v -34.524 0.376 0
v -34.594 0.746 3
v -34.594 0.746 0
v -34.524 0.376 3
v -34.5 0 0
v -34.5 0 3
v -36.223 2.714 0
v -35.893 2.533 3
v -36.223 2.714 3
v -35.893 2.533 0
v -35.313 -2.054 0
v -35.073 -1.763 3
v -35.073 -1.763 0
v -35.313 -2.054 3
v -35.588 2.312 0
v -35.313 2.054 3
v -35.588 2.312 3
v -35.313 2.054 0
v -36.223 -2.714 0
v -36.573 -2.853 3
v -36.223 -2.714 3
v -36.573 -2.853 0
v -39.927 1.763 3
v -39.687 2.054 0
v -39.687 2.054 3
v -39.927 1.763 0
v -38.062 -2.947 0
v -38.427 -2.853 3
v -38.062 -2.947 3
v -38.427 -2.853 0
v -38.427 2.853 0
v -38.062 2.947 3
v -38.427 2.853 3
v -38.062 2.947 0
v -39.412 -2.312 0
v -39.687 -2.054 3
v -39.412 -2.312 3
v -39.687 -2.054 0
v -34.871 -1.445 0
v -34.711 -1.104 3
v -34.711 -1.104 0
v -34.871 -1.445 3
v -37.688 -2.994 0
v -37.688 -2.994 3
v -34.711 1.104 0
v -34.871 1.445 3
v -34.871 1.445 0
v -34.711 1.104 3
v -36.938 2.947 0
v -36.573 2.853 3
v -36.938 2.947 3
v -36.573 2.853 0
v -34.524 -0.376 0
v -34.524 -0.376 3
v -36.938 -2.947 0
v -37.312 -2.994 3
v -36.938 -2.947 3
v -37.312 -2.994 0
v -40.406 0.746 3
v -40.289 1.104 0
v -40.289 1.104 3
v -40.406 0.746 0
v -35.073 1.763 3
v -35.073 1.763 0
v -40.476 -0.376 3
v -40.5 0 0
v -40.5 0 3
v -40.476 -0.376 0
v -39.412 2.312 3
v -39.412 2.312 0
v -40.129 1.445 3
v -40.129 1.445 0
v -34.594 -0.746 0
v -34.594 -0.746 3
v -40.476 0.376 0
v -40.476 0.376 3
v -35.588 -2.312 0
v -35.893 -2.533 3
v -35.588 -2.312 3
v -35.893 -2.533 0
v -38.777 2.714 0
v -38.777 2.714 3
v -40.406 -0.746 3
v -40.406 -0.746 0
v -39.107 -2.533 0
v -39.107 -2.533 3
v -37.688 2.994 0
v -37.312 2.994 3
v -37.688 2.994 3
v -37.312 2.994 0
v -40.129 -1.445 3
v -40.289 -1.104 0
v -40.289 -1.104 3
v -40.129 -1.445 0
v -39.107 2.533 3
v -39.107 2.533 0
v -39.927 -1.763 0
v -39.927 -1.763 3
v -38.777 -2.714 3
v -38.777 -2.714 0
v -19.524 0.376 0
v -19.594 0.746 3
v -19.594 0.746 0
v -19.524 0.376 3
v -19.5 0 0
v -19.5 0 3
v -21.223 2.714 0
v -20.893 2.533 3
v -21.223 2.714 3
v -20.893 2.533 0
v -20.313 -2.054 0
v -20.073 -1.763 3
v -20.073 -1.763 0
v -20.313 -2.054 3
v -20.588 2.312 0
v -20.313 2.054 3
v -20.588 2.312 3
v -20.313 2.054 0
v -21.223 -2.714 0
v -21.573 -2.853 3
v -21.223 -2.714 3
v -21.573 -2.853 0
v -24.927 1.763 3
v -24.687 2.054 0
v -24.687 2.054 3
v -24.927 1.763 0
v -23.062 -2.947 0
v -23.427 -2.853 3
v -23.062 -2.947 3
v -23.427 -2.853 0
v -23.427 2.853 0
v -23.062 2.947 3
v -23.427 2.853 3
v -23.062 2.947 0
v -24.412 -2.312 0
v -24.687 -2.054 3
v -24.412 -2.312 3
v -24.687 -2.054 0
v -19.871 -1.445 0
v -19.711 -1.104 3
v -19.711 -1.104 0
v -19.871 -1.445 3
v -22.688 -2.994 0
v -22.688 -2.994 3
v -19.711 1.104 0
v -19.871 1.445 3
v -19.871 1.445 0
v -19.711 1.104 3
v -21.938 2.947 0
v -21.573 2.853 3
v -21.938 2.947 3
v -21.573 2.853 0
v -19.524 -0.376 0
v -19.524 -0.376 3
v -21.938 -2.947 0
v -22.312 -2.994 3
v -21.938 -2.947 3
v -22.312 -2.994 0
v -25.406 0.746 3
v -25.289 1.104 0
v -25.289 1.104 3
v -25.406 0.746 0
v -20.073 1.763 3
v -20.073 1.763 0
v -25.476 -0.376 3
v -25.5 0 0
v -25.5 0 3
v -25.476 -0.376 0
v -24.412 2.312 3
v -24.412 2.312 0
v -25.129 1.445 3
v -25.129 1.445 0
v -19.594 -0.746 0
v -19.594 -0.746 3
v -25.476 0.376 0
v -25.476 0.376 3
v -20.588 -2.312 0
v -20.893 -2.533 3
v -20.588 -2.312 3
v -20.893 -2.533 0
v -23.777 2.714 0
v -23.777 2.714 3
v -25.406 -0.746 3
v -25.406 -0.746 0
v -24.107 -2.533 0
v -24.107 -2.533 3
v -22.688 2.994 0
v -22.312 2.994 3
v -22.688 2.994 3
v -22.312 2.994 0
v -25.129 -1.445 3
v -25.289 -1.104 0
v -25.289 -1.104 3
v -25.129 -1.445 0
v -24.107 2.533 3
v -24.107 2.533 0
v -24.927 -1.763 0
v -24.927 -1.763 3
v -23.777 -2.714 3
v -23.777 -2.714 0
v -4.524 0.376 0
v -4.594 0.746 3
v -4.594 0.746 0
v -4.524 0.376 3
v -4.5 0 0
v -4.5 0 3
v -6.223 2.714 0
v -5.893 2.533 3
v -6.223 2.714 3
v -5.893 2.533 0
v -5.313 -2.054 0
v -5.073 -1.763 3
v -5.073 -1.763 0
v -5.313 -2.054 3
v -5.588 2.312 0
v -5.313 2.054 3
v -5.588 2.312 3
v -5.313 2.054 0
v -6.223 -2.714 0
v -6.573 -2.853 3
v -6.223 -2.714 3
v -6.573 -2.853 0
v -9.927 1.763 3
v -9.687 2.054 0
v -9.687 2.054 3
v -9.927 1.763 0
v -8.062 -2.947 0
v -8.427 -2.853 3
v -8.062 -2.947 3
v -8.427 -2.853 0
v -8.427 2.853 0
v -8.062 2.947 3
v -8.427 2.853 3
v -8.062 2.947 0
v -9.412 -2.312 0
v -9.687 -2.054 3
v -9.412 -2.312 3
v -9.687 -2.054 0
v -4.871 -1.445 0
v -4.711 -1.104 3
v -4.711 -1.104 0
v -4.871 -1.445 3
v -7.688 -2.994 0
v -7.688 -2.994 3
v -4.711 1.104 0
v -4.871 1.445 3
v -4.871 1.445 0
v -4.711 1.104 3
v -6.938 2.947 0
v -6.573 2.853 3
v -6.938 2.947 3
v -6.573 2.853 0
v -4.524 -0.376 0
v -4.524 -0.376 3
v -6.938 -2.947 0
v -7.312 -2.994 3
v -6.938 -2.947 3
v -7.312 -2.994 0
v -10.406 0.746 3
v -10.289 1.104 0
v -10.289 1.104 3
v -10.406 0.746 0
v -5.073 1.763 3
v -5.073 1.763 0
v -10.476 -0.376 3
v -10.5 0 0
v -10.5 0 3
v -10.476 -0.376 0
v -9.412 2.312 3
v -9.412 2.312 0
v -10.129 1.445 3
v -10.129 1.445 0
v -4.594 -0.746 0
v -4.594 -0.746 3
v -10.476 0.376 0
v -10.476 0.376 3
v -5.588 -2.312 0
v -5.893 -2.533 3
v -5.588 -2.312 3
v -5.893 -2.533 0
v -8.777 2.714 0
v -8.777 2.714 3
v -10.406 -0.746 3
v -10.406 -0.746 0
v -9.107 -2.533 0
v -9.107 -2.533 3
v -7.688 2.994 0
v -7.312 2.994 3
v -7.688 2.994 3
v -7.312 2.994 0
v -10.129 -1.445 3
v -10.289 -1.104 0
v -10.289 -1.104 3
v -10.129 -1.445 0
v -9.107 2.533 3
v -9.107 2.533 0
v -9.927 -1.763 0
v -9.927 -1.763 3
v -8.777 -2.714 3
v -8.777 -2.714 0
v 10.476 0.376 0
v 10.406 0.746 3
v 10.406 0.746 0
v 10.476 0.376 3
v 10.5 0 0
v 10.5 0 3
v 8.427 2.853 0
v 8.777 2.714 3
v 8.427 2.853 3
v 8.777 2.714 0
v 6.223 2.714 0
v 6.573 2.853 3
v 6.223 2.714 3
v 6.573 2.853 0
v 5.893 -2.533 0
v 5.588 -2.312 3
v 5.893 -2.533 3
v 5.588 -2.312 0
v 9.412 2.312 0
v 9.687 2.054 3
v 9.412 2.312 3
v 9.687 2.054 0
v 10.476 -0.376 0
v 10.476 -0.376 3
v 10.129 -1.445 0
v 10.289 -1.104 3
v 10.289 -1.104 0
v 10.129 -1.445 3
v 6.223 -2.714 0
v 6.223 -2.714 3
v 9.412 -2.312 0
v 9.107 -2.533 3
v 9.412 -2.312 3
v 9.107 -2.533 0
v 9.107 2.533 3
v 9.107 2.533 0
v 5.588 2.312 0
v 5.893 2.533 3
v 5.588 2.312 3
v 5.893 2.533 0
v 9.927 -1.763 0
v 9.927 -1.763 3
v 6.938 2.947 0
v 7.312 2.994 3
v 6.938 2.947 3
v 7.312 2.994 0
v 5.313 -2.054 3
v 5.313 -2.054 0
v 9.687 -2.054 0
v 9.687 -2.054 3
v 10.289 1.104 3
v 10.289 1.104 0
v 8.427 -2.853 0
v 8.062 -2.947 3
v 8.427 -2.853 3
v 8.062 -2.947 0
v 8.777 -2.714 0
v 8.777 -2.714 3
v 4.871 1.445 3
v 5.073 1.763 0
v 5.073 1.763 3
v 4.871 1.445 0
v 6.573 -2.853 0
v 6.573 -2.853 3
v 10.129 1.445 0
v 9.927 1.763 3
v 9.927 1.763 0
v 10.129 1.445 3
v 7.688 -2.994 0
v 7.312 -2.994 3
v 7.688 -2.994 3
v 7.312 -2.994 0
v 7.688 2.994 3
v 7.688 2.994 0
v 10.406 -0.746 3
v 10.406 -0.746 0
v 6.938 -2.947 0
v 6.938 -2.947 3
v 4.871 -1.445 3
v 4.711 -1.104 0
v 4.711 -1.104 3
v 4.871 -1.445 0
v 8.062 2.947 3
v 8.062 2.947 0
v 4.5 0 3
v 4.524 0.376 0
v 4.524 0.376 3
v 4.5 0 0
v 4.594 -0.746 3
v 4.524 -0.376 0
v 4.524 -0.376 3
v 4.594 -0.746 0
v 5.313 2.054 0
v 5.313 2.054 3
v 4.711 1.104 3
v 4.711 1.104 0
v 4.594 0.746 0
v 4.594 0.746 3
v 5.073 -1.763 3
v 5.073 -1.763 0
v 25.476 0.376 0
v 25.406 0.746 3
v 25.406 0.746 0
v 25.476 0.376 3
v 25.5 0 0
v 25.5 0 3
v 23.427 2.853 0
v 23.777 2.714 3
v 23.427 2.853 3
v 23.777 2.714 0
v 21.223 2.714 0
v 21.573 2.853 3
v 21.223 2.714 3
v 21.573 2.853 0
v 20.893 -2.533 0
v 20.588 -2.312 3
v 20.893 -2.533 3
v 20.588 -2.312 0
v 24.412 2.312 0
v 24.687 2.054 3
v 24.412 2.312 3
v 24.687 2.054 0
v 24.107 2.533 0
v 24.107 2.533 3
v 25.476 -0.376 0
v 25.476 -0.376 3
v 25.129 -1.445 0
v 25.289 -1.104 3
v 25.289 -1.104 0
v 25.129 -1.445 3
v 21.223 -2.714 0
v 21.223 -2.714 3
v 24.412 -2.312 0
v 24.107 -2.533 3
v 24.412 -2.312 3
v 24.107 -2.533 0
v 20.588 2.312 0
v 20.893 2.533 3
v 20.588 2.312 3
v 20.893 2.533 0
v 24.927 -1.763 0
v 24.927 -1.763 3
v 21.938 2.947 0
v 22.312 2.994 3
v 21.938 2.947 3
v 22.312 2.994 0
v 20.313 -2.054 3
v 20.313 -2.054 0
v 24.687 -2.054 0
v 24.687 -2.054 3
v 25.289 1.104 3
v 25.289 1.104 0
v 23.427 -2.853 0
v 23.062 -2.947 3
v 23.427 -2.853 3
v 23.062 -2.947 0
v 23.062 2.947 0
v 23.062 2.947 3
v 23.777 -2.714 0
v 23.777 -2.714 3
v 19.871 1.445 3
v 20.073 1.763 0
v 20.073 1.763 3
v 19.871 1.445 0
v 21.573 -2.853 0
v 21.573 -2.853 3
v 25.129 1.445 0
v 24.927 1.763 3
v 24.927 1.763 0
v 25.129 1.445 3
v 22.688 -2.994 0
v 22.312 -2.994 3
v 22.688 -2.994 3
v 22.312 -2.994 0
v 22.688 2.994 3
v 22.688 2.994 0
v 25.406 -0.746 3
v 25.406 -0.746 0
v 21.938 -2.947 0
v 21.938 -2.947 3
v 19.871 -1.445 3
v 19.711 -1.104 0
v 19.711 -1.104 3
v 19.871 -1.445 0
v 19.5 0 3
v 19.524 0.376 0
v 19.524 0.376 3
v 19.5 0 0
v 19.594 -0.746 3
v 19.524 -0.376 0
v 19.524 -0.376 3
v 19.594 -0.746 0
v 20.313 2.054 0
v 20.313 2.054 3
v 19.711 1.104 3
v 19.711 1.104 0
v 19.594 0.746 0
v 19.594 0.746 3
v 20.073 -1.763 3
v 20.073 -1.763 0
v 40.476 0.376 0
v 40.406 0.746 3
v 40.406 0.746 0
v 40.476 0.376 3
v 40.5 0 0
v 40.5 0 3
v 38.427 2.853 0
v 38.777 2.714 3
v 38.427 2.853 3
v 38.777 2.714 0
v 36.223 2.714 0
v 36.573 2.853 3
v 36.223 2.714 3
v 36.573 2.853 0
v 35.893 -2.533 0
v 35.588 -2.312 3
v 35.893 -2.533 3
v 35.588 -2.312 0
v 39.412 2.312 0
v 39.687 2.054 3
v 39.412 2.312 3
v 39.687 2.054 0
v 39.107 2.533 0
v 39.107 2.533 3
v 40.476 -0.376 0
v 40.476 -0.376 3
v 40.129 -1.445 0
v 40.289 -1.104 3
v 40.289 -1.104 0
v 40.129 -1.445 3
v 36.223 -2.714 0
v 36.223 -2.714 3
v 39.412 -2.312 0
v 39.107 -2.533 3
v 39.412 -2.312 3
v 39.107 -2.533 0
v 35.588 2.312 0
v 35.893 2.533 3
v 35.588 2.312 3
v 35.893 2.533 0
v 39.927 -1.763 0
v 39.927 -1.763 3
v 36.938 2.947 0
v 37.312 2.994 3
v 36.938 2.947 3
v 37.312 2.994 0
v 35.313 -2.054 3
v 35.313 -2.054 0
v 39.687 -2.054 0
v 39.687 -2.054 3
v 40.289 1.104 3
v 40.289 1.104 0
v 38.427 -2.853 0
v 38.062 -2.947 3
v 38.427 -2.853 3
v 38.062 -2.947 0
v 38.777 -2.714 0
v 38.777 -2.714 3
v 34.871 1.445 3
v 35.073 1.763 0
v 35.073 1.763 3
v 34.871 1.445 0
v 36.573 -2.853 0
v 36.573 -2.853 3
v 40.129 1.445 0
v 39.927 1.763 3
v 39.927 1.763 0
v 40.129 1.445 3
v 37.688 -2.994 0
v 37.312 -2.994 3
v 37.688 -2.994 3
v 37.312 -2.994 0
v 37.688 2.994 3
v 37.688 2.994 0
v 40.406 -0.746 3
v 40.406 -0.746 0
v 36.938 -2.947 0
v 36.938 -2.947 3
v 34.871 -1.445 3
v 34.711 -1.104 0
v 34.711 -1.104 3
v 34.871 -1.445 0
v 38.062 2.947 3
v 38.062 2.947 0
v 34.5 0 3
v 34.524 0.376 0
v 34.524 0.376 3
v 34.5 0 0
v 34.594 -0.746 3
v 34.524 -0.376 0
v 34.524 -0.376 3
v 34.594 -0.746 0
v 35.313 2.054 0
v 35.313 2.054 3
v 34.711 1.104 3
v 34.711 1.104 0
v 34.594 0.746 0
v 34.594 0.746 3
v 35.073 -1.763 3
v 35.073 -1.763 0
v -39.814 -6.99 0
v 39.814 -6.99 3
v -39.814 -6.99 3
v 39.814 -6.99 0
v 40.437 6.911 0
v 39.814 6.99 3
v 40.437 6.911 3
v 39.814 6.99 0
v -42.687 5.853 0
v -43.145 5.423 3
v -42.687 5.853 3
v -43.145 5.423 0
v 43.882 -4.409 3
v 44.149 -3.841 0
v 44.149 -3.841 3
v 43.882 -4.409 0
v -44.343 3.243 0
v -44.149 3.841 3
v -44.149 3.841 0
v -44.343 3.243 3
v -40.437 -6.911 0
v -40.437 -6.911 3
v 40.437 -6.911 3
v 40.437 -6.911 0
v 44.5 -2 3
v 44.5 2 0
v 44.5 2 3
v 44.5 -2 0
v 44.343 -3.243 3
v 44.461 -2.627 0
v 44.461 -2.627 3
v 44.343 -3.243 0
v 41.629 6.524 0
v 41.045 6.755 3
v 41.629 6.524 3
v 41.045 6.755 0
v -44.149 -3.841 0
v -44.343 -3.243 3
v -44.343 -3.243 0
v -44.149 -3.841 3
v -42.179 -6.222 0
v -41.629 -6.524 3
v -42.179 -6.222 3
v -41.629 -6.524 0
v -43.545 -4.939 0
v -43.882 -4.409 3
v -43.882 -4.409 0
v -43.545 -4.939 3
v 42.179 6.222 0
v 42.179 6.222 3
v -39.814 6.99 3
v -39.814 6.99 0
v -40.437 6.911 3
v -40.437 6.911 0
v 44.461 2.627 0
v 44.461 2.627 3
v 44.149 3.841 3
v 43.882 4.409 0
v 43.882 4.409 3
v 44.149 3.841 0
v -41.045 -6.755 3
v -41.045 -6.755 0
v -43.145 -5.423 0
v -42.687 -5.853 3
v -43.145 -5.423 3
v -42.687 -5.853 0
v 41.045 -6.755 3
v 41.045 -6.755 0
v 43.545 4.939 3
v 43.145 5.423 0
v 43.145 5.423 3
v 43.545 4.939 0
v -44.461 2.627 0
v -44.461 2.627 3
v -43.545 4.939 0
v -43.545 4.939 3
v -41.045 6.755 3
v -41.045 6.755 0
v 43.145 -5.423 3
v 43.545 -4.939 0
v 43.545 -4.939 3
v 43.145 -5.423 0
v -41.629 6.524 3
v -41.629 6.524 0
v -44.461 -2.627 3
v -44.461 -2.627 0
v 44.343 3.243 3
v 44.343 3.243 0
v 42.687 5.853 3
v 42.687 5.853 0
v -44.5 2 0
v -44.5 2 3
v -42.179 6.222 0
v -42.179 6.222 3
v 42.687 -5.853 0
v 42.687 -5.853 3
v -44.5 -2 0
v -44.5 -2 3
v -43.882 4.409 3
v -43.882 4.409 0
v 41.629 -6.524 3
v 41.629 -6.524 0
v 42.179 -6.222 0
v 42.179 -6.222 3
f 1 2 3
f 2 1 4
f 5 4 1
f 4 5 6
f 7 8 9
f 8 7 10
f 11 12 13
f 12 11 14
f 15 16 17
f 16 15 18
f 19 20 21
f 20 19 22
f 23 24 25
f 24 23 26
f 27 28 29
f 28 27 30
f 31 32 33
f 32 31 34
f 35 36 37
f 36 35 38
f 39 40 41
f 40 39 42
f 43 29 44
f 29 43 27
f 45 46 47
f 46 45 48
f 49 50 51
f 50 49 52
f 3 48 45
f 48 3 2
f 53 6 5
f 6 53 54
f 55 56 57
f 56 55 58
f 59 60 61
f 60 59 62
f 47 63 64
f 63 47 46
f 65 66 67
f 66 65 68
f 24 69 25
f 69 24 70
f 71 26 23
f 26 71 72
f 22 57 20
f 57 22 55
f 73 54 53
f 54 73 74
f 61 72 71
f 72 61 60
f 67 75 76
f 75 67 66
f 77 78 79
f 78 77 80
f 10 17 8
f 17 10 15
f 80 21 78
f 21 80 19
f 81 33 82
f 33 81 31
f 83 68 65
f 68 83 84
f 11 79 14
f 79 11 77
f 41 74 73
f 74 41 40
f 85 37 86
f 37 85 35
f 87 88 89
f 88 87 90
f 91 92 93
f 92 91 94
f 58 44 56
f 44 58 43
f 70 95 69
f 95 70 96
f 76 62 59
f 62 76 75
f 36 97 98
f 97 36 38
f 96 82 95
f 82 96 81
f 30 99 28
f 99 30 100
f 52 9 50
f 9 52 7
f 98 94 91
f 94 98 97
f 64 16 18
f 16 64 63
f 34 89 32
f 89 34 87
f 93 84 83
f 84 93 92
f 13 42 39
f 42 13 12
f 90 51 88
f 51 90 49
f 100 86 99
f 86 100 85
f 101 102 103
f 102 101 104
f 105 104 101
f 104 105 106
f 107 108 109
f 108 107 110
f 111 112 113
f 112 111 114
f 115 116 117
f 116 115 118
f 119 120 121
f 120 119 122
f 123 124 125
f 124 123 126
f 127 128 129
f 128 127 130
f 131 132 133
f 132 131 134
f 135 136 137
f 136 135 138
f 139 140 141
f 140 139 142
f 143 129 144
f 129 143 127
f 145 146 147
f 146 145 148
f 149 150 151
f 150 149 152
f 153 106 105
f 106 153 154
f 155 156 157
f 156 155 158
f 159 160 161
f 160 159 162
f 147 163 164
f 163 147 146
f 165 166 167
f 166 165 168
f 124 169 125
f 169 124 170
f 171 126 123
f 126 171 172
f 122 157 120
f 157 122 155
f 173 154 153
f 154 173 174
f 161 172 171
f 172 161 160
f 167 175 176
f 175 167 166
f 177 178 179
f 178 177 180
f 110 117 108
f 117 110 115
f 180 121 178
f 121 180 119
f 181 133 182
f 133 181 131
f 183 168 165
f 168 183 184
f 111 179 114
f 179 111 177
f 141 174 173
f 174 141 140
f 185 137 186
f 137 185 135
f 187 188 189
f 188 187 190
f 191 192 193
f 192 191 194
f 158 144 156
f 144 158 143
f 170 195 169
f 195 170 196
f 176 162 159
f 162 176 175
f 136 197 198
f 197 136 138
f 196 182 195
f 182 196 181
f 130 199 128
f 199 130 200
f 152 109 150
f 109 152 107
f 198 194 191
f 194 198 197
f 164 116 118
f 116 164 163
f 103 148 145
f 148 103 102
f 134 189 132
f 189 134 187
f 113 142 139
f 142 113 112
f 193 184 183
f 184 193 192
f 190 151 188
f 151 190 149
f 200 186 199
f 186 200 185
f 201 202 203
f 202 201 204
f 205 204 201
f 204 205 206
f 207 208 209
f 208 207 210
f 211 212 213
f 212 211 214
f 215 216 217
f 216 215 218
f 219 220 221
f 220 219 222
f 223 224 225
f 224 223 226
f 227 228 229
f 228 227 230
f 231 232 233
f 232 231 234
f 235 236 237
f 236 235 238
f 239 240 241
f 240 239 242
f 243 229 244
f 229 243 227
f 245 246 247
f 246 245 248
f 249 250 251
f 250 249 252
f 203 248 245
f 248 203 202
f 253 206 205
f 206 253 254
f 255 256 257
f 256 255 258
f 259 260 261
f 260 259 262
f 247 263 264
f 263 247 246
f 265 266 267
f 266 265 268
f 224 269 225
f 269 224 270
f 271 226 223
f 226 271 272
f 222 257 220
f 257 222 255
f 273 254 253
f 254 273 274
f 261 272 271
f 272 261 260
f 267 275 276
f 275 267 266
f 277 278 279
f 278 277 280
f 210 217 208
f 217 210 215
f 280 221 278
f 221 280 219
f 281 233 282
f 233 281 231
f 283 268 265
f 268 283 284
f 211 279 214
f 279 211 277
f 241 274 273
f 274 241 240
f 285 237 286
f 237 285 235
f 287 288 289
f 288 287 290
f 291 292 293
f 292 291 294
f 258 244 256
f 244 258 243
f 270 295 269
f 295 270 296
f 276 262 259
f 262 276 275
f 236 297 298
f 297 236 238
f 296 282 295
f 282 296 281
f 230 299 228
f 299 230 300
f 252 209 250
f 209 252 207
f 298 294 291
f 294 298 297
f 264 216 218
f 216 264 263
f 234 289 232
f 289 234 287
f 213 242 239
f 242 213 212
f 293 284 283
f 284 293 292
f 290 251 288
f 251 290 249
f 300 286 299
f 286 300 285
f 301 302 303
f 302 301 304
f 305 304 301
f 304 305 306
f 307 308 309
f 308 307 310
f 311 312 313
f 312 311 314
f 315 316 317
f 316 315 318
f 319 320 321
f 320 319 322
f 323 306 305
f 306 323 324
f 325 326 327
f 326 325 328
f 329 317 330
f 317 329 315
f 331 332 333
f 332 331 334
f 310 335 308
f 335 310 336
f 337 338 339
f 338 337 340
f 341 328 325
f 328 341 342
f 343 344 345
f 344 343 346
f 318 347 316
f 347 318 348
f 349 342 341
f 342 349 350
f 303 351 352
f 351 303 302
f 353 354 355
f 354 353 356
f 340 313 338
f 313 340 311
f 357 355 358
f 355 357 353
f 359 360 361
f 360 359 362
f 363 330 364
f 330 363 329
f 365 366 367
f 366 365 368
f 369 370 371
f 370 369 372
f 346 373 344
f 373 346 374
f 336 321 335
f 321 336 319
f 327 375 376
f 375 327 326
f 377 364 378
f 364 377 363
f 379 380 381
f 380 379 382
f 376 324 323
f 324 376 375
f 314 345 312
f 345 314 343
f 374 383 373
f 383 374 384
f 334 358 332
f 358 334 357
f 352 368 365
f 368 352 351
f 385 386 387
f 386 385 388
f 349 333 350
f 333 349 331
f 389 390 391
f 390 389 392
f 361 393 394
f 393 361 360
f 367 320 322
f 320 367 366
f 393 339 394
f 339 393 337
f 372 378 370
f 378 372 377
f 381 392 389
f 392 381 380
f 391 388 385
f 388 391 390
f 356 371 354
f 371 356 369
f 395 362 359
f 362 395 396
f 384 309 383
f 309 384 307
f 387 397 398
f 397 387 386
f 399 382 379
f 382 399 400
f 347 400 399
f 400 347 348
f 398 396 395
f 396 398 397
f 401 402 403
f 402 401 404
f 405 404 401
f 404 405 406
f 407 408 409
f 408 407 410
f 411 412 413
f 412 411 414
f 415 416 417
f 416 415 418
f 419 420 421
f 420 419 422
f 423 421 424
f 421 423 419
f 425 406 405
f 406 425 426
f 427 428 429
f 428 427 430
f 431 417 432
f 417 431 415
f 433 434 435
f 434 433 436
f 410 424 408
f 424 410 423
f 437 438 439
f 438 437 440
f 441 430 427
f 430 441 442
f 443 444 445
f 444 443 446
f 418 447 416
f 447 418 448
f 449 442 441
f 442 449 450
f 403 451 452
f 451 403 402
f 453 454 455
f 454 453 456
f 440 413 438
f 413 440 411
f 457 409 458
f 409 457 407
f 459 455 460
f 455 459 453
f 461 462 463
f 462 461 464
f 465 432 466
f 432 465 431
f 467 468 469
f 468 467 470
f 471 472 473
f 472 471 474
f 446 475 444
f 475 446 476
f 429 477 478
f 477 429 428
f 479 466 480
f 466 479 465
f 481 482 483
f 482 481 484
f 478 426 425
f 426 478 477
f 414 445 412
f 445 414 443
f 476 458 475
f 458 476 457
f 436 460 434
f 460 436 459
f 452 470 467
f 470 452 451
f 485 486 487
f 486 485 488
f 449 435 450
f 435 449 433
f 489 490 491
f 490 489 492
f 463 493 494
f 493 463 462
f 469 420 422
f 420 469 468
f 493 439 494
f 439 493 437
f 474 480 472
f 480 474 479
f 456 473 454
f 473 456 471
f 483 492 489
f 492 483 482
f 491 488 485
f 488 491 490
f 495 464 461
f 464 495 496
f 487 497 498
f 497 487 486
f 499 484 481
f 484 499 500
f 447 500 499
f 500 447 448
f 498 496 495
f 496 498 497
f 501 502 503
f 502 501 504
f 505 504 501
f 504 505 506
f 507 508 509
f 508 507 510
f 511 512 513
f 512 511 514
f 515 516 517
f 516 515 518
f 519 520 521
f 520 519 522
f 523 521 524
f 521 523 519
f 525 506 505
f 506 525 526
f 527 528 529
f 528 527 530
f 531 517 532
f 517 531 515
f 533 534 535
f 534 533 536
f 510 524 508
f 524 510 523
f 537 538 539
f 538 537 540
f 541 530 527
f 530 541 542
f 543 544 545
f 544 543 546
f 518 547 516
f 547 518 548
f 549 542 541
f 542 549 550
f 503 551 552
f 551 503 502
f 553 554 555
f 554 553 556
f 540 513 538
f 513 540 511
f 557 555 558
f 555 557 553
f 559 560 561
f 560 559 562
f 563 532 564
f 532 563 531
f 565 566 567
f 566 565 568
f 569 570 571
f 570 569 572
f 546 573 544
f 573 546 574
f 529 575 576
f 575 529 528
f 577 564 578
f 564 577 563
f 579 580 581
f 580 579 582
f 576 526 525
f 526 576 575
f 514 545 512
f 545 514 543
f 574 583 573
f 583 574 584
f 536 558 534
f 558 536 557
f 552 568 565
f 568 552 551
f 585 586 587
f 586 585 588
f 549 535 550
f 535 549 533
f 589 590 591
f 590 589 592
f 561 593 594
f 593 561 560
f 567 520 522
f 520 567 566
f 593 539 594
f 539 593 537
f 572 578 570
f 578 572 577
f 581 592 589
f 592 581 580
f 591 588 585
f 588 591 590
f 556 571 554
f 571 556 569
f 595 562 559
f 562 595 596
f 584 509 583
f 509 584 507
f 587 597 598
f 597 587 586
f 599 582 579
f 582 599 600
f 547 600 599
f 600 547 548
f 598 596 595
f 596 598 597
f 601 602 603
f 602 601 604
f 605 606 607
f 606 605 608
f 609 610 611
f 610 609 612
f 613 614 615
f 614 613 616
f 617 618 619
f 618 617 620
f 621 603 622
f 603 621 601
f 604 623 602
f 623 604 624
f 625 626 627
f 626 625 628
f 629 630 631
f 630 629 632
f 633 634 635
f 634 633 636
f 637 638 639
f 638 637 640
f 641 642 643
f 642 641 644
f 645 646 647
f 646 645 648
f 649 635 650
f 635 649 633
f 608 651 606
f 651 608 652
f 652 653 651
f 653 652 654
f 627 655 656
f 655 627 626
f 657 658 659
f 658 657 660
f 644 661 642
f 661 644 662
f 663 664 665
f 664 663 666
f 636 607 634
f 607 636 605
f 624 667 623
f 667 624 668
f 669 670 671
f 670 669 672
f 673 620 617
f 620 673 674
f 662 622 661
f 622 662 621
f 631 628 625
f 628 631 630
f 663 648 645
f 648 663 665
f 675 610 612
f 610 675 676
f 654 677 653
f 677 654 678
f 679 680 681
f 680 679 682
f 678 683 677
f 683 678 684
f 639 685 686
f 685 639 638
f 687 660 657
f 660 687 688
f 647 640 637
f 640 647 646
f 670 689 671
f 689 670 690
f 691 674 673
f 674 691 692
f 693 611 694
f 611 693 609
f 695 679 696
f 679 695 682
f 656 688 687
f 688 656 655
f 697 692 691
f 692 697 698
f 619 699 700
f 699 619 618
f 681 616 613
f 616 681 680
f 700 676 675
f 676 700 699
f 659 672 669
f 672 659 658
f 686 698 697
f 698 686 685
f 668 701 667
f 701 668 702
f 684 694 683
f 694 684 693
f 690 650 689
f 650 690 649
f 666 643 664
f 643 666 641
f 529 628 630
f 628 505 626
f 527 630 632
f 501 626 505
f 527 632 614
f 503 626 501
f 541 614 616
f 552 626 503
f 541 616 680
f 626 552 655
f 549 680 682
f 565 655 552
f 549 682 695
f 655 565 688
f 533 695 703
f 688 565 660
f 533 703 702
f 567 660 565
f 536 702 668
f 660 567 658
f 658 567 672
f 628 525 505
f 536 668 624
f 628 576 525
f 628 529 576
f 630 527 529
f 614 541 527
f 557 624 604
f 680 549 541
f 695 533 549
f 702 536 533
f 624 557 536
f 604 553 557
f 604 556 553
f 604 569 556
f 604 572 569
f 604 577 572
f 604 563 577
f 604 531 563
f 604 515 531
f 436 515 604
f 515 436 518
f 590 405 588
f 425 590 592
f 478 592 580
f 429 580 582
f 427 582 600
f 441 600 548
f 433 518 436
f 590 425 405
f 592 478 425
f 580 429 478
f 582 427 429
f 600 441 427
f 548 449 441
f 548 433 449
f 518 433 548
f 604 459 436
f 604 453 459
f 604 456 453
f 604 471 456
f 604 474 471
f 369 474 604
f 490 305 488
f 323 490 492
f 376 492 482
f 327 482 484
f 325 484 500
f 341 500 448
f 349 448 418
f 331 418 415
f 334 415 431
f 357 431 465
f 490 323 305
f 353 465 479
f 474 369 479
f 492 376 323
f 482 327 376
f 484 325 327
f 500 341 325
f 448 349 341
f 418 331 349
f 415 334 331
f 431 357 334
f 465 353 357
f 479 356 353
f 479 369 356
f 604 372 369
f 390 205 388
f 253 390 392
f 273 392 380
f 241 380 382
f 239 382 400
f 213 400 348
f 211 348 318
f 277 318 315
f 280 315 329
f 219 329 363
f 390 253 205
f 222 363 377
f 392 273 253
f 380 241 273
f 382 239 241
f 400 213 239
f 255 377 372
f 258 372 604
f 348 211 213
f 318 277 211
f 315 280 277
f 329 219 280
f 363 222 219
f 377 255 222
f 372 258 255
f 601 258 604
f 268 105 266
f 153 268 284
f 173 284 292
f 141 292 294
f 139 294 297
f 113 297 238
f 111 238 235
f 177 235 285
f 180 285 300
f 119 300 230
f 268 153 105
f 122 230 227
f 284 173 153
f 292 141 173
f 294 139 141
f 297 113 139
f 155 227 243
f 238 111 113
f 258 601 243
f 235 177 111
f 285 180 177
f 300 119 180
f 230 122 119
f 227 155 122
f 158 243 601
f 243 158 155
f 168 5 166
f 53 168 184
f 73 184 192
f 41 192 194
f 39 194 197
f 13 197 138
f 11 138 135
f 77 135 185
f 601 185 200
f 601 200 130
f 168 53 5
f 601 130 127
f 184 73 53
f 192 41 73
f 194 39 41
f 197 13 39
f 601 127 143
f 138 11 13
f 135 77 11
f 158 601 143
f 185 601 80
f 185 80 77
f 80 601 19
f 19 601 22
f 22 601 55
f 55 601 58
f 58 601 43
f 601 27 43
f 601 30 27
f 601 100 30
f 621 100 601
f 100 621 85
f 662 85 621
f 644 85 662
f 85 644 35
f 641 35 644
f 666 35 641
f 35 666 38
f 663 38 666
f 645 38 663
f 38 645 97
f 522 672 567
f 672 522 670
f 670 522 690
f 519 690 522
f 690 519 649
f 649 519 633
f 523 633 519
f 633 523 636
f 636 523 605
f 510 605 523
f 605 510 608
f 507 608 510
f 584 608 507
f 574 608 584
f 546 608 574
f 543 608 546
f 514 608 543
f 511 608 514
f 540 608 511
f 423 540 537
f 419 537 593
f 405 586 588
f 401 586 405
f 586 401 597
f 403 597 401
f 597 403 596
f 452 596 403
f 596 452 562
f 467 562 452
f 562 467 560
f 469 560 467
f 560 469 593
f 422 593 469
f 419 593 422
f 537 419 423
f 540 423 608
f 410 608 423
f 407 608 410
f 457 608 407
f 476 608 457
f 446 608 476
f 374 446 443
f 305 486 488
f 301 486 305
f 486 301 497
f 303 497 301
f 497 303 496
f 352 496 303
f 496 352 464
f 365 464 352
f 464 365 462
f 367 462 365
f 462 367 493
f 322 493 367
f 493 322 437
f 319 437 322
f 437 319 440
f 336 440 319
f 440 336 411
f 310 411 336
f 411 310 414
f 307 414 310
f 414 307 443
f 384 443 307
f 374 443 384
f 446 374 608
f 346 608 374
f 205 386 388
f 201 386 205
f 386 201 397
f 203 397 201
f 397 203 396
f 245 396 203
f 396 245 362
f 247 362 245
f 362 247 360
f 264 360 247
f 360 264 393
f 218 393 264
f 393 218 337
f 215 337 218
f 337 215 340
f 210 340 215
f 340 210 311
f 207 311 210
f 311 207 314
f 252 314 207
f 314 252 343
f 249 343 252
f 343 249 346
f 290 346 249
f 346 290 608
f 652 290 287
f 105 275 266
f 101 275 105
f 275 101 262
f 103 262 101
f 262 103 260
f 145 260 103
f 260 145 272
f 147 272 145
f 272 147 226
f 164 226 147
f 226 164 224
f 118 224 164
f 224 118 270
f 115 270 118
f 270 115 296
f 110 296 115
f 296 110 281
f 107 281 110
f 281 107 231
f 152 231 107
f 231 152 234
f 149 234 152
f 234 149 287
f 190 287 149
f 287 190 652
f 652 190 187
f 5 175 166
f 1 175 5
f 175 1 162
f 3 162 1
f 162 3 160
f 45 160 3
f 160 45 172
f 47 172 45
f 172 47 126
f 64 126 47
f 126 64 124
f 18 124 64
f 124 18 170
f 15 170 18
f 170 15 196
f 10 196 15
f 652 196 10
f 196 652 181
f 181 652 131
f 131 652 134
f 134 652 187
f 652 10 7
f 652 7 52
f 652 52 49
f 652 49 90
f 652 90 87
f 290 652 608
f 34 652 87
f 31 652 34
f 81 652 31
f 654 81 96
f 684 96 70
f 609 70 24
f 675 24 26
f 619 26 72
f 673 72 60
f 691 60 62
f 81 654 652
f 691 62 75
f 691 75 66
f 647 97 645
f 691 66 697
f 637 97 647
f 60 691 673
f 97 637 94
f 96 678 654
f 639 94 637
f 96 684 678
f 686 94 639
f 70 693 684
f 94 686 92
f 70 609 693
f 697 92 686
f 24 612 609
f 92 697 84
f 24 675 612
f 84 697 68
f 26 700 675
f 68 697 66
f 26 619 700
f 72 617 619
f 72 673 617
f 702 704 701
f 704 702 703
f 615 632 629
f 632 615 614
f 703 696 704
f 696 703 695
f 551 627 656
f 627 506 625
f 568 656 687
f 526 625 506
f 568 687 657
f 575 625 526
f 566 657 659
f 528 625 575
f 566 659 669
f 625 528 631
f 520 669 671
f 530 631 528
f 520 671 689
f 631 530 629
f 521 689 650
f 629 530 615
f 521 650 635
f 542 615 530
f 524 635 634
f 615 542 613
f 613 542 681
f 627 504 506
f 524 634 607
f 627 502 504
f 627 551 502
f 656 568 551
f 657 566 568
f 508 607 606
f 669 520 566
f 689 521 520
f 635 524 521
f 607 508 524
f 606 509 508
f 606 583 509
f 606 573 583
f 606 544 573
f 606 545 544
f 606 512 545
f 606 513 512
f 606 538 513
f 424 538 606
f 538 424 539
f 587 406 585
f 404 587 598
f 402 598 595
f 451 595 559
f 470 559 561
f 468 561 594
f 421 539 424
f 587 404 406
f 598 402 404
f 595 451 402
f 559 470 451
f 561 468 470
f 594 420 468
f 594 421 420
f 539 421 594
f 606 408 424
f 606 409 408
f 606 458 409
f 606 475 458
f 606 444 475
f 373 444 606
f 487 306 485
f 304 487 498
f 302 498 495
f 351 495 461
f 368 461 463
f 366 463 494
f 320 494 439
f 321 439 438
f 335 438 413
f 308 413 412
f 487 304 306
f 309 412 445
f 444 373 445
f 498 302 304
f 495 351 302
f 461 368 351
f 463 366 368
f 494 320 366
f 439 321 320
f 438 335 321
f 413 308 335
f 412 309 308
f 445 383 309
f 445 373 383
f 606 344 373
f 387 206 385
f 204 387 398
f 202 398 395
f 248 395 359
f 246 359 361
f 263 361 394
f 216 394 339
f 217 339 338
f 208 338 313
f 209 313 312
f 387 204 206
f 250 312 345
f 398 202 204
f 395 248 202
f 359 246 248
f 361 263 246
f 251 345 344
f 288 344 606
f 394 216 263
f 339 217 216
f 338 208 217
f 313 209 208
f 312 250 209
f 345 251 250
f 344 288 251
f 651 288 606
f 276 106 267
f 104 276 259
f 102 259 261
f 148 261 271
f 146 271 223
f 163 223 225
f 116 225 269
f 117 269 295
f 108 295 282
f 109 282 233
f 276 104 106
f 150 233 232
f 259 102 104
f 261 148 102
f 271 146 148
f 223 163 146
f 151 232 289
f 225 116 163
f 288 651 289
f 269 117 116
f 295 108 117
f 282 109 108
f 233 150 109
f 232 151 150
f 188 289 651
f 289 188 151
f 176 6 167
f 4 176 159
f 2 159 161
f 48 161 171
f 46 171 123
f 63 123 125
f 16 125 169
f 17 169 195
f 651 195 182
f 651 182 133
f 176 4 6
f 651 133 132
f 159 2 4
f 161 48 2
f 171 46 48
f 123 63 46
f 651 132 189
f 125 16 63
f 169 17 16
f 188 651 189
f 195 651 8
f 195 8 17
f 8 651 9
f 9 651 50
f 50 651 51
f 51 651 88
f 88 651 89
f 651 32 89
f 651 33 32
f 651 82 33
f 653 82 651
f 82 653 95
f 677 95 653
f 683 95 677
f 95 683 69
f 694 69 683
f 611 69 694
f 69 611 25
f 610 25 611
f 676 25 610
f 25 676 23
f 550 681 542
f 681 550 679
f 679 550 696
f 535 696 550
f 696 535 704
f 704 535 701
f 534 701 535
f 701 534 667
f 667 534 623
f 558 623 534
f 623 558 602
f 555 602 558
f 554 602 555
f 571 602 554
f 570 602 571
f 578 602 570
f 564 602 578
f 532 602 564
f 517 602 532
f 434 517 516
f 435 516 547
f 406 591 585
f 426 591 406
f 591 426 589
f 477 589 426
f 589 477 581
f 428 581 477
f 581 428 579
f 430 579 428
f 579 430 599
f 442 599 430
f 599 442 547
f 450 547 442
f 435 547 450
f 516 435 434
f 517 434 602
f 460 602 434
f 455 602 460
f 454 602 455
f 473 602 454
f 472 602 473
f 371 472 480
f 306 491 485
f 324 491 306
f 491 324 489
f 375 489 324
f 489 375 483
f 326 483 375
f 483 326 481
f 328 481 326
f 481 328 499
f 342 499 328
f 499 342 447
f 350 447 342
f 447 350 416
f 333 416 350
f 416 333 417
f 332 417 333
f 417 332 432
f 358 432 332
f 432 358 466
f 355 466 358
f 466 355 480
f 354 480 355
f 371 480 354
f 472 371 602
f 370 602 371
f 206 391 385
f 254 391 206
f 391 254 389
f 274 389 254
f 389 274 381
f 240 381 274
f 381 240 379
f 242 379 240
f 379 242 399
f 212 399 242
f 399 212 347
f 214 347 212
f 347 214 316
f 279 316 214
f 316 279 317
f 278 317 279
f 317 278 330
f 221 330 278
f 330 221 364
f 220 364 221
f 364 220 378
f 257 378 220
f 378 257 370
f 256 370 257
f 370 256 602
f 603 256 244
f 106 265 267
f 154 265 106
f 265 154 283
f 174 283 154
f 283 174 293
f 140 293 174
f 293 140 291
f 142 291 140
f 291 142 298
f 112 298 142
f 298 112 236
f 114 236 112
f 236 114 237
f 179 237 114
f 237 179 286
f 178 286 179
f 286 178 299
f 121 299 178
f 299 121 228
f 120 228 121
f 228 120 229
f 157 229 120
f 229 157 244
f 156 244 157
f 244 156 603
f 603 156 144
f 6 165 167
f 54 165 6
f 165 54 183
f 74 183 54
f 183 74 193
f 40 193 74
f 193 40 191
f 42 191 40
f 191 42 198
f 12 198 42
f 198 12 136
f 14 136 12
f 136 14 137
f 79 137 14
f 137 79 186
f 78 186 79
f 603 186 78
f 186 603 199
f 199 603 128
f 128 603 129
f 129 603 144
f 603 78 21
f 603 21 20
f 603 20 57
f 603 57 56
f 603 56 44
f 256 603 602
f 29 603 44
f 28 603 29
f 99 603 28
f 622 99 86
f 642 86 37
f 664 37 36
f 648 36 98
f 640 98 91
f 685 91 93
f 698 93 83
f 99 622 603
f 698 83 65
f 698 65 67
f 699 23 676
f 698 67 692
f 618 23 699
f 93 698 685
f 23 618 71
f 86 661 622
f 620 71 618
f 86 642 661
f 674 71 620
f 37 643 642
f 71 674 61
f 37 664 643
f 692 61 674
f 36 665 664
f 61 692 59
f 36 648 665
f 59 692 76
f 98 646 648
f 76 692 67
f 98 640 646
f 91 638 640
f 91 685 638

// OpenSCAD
$fn = 50;


difference() {
	union() {
		translate(v = [0, 0, 0]) {
			rotate(a = [0, 0, 0]) {
				hull() {
					translate(v = [-39.5000000000, 2.0000000000, 0]) {
						rotate(a = [0, 0, 0]) {
							translate(v = [0, 0, 0]) {
								rotate(a = [0, 0, 0]) {
									cylinder(h = 3, r = 5);
								}
							}
						}
					}
					translate(v = [39.5000000000, 2.0000000000, 0]) {
						rotate(a = [0, 0, 0]) {
							translate(v = [0, 0, 0]) {
								rotate(a = [0, 0, 0]) {
									cylinder(h = 3, r = 5);
								}
							}
						}
					}
					translate(v = [-39.5000000000, -2.0000000000, 0]) {
						rotate(a = [0, 0, 0]) {
							translate(v = [0, 0, 0]) {
								rotate(a = [0, 0, 0]) {
									cylinder(h = 3, r = 5);
								}
							}
						}
					}
					translate(v = [39.5000000000, -2.0000000000, 0]) {
						rotate(a = [0, 0, 0]) {
							translate(v = [0, 0, 0]) {
								rotate(a = [0, 0, 0]) {
									cylinder(h = 3, r = 5);
								}
							}
						}
					}
				}
			}
		}
	}
	union() {
		translate(v = [-37.5000000000, 0.0000000000, 0]) {
			rotate(a = [0, 0, 0]) {
				translate(v = [0, 0, -50]) {
					rotate(a = [0, 0, 0]) {
						cylinder(h = 100, r = 3.0000000000);
					}
				}
			}
		}
		translate(v = [-22.5000000000, 0.0000000000, 0]) {
			rotate(a = [0, 0, 0]) {
				translate(v = [0, 0, -50]) {
					rotate(a = [0, 0, 0]) {
						cylinder(h = 100, r = 3.0000000000);
					}
				}
			}
		}
		translate(v = [-7.5000000000, 0.0000000000, 0]) {
			rotate(a = [0, 0, 0]) {
				translate(v = [0, 0, -50]) {
					rotate(a = [0, 0, 0]) {
						cylinder(h = 100, r = 3.0000000000);
					}
				}
			}
		}
		translate(v = [7.5000000000, 0.0000000000, 0]) {
			rotate(a = [0, 0, 0]) {
				translate(v = [0, 0, -50]) {
					rotate(a = [0, 0, 0]) {
						cylinder(h = 100, r = 3.0000000000);
					}
				}
			}
		}
		translate(v = [22.5000000000, 0.0000000000, 0]) {
			rotate(a = [0, 0, 0]) {
				translate(v = [0, 0, -50]) {
					rotate(a = [0, 0, 0]) {
						cylinder(h = 100, r = 3.0000000000);
					}
				}
			}
		}
		translate(v = [37.5000000000, 0.0000000000, 0]) {
			rotate(a = [0, 0, 0]) {
				translate(v = [0, 0, -50]) {
					rotate(a = [0, 0, 0]) {
						cylinder(h = 100, r = 3.0000000000);
					}
				}
			}
		}
	}
}
